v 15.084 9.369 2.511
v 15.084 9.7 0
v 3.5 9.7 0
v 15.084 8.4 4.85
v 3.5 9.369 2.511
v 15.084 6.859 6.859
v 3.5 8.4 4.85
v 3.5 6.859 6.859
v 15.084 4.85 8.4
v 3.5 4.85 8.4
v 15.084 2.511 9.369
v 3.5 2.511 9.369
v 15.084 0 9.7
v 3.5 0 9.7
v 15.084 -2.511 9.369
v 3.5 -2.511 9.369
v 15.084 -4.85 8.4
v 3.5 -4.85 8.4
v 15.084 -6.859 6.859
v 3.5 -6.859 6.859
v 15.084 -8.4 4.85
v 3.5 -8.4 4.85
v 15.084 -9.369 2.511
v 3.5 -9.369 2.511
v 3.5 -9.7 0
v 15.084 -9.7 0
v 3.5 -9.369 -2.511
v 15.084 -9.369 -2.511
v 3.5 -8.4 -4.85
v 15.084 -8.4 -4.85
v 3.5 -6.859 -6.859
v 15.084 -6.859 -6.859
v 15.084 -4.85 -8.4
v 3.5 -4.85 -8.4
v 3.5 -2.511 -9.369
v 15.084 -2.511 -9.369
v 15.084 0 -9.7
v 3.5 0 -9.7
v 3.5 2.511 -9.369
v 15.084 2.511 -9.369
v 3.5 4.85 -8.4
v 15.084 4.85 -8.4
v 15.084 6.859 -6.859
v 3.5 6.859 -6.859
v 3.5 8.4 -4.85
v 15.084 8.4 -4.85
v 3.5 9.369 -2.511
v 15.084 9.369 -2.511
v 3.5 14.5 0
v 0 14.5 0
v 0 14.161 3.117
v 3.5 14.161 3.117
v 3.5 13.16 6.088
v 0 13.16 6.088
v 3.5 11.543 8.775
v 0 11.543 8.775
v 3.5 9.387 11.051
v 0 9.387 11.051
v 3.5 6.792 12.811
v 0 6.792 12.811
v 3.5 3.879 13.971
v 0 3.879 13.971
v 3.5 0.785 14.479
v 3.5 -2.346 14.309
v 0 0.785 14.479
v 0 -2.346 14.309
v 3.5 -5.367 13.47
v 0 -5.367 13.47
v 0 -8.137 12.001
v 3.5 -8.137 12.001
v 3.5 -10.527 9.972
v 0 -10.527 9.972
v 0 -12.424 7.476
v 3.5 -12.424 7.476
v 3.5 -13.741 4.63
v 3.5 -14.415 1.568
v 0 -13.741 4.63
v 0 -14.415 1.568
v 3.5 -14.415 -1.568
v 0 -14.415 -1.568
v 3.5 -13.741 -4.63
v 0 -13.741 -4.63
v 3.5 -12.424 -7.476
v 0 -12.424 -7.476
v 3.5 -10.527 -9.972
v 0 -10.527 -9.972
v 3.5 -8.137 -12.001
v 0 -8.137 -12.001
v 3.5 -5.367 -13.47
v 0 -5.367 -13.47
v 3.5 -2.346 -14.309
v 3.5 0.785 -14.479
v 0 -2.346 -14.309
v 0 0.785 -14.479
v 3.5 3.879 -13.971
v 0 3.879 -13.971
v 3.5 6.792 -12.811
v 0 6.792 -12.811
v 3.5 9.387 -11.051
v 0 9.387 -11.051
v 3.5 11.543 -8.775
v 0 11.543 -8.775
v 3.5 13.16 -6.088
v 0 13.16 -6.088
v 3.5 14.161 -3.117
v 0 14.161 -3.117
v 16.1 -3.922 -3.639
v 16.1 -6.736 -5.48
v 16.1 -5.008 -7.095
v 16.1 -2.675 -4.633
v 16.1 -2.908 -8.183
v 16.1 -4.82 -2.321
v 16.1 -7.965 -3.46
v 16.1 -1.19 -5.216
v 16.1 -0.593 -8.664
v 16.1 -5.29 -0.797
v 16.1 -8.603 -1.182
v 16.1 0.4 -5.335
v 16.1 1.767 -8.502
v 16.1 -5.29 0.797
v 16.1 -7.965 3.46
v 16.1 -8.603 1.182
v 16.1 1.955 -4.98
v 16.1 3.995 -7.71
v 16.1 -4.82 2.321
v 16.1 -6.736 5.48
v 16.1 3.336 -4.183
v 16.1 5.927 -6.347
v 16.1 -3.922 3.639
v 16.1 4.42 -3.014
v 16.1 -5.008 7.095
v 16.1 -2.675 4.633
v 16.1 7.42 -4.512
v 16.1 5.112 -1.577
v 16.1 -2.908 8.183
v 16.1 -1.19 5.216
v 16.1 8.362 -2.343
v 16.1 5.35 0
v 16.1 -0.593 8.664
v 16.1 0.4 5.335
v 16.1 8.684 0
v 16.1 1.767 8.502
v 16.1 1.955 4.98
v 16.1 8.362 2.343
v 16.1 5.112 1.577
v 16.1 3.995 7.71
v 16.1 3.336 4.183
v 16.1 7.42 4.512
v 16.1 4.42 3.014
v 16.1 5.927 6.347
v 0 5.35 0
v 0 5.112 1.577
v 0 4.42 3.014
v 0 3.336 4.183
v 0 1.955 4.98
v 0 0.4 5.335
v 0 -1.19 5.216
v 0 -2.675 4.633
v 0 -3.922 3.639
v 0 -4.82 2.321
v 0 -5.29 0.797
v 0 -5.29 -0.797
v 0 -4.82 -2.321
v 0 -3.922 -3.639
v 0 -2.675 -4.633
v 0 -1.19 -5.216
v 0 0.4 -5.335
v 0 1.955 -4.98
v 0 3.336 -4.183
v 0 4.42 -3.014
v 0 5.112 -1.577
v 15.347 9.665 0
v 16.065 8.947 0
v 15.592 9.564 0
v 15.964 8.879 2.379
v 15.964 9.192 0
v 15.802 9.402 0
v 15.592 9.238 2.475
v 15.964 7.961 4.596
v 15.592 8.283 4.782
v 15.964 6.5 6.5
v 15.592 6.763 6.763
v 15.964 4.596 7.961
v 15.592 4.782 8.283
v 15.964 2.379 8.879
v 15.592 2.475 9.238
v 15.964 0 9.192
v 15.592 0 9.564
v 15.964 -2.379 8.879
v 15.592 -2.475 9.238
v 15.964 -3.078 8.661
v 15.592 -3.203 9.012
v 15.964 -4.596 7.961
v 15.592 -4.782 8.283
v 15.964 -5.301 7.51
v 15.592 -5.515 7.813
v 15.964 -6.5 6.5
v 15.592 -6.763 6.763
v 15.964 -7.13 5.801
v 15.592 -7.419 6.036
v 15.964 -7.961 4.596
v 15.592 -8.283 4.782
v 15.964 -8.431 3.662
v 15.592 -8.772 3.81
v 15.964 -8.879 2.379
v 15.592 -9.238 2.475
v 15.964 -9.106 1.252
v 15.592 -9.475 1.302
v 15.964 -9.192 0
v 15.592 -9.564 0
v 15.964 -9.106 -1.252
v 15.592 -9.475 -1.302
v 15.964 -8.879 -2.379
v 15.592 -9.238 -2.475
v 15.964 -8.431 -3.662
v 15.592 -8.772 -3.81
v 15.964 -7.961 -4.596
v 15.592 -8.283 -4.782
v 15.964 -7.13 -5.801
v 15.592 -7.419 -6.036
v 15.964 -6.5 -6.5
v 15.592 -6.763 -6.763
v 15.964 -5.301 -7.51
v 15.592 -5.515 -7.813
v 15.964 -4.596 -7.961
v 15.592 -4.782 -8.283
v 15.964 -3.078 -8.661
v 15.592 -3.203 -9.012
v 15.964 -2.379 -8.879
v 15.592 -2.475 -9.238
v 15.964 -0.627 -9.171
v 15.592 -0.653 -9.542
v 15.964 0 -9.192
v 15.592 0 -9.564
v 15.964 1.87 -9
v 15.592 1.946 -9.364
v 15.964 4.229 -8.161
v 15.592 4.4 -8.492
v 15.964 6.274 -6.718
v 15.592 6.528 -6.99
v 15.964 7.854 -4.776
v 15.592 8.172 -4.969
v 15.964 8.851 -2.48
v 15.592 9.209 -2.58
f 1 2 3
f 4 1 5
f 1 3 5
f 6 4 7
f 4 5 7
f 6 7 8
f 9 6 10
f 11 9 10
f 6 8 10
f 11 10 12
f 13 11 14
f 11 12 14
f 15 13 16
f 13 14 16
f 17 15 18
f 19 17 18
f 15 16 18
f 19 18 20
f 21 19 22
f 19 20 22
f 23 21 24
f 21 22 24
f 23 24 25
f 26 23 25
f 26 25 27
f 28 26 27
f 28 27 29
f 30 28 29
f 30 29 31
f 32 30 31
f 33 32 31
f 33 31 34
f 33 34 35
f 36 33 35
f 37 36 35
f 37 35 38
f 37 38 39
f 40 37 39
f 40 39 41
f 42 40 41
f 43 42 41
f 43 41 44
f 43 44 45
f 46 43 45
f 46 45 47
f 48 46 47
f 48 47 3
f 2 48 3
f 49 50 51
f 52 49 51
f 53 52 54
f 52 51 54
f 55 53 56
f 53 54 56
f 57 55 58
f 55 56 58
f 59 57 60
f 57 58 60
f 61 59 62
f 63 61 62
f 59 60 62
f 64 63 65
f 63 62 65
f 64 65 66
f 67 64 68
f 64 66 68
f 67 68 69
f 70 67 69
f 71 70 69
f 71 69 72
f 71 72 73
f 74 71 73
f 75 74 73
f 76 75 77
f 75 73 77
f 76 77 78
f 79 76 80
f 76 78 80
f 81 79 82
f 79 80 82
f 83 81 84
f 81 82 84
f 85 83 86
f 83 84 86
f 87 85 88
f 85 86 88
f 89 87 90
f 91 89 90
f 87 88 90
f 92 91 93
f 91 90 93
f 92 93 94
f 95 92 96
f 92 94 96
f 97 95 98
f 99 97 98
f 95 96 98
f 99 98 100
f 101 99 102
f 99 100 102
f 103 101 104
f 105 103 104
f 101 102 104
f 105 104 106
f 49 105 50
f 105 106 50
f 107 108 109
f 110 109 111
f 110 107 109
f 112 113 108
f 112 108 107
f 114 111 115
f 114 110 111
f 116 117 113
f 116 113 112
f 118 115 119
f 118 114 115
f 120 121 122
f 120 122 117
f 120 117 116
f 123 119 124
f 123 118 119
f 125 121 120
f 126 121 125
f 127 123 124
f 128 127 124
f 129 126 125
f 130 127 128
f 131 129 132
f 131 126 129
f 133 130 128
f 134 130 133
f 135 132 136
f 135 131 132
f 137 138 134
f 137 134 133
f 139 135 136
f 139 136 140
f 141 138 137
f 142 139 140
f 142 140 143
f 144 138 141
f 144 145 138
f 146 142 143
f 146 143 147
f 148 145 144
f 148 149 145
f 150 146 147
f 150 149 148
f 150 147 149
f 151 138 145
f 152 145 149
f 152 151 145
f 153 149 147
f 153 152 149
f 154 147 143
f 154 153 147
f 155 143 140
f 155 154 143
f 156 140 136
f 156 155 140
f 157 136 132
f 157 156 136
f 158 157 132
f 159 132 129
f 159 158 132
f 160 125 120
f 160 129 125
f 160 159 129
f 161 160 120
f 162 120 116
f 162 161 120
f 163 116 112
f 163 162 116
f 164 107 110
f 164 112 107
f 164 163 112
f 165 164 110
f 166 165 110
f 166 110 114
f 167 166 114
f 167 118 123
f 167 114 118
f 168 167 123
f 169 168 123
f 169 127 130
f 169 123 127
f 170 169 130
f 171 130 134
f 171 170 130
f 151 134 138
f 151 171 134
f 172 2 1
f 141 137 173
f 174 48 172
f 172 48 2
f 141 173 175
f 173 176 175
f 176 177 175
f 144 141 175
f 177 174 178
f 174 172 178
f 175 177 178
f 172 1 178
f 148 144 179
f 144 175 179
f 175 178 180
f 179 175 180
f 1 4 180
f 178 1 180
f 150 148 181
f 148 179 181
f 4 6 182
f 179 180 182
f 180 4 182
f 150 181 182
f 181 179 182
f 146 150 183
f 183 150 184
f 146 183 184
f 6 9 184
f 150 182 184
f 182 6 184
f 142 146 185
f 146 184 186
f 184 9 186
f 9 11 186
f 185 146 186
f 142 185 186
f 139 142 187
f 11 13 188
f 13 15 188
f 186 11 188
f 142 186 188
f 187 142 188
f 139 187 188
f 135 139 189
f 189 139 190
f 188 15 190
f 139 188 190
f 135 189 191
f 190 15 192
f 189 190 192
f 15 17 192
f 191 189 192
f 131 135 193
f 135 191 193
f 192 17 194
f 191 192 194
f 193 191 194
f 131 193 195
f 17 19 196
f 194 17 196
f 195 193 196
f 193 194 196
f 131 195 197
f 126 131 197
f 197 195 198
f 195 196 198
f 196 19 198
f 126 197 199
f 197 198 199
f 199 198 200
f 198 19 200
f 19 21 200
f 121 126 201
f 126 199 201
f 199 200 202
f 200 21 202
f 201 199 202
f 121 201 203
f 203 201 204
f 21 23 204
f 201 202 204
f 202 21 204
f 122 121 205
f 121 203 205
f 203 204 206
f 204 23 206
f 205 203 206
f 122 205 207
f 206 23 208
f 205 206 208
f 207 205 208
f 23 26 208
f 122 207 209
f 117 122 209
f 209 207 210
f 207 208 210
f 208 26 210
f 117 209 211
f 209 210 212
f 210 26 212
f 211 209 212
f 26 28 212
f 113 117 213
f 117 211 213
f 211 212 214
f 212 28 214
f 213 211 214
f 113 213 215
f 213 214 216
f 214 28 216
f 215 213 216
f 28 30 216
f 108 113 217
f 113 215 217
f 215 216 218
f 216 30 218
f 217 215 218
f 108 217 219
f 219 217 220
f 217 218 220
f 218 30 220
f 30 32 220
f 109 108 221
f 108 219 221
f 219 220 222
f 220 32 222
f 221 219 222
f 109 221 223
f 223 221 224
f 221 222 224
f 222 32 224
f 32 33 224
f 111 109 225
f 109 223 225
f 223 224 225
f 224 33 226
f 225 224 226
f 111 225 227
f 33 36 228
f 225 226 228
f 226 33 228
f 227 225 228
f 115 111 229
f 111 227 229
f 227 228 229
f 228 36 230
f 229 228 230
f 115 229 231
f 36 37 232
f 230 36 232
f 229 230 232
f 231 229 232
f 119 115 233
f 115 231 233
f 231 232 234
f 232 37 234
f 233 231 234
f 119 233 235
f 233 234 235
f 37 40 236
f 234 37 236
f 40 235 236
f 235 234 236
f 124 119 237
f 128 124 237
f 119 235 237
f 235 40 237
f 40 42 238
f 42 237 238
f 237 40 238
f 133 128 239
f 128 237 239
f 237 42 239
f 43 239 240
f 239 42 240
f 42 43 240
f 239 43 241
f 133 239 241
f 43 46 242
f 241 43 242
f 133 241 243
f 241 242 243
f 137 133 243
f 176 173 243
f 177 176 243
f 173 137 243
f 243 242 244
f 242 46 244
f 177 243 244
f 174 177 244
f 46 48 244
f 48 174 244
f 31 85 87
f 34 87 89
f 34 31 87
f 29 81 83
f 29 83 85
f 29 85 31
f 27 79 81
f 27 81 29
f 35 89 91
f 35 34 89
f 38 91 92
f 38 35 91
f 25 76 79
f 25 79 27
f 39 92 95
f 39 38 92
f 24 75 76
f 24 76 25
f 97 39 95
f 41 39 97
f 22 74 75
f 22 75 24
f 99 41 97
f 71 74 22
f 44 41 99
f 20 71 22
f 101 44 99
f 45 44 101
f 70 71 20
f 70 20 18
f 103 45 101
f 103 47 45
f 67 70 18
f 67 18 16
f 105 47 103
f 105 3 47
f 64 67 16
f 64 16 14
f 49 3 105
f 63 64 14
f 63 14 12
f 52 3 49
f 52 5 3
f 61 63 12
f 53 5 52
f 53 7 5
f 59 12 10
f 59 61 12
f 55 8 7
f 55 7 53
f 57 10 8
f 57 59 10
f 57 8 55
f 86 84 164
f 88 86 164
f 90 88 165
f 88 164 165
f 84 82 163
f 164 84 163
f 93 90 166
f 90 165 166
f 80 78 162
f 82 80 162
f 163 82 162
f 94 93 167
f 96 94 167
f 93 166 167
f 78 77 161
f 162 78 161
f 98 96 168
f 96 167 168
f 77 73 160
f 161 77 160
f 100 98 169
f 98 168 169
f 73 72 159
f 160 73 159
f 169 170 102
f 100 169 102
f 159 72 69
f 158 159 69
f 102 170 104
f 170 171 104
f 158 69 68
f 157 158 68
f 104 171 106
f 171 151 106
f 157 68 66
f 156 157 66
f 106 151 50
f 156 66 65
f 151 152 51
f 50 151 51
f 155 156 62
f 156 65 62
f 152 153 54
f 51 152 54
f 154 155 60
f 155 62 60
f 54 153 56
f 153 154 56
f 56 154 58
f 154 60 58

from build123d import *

# Parameters (mm, degrees)
F0_R     = 14.5
F1_DEPTH = 3.5
F2_R     = 9.7
F3_DEPTH = 16.1
F4_R     = 5.35
F5_DEPTH = 25.4
F6_R     = 1.016


with BuildPart() as f1:
    # F0 (on Right) → F1 (new body)
    with BuildSketch(Plane.YZ):
        Circle(F0_R)
    extrude(amount=F1_DEPTH)

    # F2 (on Right) → F3 (join)
    with BuildSketch(Plane.YZ):
        Circle(F2_R)
    extrude(amount=F3_DEPTH)

    # F4 (on Right) → F5 (cut)
    with BuildSketch(Plane.YZ):
        Circle(F4_R)
    extrude(amount=F5_DEPTH, mode=Mode.SUBTRACT)

    # F6
    f6_edges = [f1.edges().sort_by_distance(p)[0] for p in [
        (16.1, -9.7, 0),
    ]]
    fillet(f6_edges, radius=F6_R)


solid = f1.part
